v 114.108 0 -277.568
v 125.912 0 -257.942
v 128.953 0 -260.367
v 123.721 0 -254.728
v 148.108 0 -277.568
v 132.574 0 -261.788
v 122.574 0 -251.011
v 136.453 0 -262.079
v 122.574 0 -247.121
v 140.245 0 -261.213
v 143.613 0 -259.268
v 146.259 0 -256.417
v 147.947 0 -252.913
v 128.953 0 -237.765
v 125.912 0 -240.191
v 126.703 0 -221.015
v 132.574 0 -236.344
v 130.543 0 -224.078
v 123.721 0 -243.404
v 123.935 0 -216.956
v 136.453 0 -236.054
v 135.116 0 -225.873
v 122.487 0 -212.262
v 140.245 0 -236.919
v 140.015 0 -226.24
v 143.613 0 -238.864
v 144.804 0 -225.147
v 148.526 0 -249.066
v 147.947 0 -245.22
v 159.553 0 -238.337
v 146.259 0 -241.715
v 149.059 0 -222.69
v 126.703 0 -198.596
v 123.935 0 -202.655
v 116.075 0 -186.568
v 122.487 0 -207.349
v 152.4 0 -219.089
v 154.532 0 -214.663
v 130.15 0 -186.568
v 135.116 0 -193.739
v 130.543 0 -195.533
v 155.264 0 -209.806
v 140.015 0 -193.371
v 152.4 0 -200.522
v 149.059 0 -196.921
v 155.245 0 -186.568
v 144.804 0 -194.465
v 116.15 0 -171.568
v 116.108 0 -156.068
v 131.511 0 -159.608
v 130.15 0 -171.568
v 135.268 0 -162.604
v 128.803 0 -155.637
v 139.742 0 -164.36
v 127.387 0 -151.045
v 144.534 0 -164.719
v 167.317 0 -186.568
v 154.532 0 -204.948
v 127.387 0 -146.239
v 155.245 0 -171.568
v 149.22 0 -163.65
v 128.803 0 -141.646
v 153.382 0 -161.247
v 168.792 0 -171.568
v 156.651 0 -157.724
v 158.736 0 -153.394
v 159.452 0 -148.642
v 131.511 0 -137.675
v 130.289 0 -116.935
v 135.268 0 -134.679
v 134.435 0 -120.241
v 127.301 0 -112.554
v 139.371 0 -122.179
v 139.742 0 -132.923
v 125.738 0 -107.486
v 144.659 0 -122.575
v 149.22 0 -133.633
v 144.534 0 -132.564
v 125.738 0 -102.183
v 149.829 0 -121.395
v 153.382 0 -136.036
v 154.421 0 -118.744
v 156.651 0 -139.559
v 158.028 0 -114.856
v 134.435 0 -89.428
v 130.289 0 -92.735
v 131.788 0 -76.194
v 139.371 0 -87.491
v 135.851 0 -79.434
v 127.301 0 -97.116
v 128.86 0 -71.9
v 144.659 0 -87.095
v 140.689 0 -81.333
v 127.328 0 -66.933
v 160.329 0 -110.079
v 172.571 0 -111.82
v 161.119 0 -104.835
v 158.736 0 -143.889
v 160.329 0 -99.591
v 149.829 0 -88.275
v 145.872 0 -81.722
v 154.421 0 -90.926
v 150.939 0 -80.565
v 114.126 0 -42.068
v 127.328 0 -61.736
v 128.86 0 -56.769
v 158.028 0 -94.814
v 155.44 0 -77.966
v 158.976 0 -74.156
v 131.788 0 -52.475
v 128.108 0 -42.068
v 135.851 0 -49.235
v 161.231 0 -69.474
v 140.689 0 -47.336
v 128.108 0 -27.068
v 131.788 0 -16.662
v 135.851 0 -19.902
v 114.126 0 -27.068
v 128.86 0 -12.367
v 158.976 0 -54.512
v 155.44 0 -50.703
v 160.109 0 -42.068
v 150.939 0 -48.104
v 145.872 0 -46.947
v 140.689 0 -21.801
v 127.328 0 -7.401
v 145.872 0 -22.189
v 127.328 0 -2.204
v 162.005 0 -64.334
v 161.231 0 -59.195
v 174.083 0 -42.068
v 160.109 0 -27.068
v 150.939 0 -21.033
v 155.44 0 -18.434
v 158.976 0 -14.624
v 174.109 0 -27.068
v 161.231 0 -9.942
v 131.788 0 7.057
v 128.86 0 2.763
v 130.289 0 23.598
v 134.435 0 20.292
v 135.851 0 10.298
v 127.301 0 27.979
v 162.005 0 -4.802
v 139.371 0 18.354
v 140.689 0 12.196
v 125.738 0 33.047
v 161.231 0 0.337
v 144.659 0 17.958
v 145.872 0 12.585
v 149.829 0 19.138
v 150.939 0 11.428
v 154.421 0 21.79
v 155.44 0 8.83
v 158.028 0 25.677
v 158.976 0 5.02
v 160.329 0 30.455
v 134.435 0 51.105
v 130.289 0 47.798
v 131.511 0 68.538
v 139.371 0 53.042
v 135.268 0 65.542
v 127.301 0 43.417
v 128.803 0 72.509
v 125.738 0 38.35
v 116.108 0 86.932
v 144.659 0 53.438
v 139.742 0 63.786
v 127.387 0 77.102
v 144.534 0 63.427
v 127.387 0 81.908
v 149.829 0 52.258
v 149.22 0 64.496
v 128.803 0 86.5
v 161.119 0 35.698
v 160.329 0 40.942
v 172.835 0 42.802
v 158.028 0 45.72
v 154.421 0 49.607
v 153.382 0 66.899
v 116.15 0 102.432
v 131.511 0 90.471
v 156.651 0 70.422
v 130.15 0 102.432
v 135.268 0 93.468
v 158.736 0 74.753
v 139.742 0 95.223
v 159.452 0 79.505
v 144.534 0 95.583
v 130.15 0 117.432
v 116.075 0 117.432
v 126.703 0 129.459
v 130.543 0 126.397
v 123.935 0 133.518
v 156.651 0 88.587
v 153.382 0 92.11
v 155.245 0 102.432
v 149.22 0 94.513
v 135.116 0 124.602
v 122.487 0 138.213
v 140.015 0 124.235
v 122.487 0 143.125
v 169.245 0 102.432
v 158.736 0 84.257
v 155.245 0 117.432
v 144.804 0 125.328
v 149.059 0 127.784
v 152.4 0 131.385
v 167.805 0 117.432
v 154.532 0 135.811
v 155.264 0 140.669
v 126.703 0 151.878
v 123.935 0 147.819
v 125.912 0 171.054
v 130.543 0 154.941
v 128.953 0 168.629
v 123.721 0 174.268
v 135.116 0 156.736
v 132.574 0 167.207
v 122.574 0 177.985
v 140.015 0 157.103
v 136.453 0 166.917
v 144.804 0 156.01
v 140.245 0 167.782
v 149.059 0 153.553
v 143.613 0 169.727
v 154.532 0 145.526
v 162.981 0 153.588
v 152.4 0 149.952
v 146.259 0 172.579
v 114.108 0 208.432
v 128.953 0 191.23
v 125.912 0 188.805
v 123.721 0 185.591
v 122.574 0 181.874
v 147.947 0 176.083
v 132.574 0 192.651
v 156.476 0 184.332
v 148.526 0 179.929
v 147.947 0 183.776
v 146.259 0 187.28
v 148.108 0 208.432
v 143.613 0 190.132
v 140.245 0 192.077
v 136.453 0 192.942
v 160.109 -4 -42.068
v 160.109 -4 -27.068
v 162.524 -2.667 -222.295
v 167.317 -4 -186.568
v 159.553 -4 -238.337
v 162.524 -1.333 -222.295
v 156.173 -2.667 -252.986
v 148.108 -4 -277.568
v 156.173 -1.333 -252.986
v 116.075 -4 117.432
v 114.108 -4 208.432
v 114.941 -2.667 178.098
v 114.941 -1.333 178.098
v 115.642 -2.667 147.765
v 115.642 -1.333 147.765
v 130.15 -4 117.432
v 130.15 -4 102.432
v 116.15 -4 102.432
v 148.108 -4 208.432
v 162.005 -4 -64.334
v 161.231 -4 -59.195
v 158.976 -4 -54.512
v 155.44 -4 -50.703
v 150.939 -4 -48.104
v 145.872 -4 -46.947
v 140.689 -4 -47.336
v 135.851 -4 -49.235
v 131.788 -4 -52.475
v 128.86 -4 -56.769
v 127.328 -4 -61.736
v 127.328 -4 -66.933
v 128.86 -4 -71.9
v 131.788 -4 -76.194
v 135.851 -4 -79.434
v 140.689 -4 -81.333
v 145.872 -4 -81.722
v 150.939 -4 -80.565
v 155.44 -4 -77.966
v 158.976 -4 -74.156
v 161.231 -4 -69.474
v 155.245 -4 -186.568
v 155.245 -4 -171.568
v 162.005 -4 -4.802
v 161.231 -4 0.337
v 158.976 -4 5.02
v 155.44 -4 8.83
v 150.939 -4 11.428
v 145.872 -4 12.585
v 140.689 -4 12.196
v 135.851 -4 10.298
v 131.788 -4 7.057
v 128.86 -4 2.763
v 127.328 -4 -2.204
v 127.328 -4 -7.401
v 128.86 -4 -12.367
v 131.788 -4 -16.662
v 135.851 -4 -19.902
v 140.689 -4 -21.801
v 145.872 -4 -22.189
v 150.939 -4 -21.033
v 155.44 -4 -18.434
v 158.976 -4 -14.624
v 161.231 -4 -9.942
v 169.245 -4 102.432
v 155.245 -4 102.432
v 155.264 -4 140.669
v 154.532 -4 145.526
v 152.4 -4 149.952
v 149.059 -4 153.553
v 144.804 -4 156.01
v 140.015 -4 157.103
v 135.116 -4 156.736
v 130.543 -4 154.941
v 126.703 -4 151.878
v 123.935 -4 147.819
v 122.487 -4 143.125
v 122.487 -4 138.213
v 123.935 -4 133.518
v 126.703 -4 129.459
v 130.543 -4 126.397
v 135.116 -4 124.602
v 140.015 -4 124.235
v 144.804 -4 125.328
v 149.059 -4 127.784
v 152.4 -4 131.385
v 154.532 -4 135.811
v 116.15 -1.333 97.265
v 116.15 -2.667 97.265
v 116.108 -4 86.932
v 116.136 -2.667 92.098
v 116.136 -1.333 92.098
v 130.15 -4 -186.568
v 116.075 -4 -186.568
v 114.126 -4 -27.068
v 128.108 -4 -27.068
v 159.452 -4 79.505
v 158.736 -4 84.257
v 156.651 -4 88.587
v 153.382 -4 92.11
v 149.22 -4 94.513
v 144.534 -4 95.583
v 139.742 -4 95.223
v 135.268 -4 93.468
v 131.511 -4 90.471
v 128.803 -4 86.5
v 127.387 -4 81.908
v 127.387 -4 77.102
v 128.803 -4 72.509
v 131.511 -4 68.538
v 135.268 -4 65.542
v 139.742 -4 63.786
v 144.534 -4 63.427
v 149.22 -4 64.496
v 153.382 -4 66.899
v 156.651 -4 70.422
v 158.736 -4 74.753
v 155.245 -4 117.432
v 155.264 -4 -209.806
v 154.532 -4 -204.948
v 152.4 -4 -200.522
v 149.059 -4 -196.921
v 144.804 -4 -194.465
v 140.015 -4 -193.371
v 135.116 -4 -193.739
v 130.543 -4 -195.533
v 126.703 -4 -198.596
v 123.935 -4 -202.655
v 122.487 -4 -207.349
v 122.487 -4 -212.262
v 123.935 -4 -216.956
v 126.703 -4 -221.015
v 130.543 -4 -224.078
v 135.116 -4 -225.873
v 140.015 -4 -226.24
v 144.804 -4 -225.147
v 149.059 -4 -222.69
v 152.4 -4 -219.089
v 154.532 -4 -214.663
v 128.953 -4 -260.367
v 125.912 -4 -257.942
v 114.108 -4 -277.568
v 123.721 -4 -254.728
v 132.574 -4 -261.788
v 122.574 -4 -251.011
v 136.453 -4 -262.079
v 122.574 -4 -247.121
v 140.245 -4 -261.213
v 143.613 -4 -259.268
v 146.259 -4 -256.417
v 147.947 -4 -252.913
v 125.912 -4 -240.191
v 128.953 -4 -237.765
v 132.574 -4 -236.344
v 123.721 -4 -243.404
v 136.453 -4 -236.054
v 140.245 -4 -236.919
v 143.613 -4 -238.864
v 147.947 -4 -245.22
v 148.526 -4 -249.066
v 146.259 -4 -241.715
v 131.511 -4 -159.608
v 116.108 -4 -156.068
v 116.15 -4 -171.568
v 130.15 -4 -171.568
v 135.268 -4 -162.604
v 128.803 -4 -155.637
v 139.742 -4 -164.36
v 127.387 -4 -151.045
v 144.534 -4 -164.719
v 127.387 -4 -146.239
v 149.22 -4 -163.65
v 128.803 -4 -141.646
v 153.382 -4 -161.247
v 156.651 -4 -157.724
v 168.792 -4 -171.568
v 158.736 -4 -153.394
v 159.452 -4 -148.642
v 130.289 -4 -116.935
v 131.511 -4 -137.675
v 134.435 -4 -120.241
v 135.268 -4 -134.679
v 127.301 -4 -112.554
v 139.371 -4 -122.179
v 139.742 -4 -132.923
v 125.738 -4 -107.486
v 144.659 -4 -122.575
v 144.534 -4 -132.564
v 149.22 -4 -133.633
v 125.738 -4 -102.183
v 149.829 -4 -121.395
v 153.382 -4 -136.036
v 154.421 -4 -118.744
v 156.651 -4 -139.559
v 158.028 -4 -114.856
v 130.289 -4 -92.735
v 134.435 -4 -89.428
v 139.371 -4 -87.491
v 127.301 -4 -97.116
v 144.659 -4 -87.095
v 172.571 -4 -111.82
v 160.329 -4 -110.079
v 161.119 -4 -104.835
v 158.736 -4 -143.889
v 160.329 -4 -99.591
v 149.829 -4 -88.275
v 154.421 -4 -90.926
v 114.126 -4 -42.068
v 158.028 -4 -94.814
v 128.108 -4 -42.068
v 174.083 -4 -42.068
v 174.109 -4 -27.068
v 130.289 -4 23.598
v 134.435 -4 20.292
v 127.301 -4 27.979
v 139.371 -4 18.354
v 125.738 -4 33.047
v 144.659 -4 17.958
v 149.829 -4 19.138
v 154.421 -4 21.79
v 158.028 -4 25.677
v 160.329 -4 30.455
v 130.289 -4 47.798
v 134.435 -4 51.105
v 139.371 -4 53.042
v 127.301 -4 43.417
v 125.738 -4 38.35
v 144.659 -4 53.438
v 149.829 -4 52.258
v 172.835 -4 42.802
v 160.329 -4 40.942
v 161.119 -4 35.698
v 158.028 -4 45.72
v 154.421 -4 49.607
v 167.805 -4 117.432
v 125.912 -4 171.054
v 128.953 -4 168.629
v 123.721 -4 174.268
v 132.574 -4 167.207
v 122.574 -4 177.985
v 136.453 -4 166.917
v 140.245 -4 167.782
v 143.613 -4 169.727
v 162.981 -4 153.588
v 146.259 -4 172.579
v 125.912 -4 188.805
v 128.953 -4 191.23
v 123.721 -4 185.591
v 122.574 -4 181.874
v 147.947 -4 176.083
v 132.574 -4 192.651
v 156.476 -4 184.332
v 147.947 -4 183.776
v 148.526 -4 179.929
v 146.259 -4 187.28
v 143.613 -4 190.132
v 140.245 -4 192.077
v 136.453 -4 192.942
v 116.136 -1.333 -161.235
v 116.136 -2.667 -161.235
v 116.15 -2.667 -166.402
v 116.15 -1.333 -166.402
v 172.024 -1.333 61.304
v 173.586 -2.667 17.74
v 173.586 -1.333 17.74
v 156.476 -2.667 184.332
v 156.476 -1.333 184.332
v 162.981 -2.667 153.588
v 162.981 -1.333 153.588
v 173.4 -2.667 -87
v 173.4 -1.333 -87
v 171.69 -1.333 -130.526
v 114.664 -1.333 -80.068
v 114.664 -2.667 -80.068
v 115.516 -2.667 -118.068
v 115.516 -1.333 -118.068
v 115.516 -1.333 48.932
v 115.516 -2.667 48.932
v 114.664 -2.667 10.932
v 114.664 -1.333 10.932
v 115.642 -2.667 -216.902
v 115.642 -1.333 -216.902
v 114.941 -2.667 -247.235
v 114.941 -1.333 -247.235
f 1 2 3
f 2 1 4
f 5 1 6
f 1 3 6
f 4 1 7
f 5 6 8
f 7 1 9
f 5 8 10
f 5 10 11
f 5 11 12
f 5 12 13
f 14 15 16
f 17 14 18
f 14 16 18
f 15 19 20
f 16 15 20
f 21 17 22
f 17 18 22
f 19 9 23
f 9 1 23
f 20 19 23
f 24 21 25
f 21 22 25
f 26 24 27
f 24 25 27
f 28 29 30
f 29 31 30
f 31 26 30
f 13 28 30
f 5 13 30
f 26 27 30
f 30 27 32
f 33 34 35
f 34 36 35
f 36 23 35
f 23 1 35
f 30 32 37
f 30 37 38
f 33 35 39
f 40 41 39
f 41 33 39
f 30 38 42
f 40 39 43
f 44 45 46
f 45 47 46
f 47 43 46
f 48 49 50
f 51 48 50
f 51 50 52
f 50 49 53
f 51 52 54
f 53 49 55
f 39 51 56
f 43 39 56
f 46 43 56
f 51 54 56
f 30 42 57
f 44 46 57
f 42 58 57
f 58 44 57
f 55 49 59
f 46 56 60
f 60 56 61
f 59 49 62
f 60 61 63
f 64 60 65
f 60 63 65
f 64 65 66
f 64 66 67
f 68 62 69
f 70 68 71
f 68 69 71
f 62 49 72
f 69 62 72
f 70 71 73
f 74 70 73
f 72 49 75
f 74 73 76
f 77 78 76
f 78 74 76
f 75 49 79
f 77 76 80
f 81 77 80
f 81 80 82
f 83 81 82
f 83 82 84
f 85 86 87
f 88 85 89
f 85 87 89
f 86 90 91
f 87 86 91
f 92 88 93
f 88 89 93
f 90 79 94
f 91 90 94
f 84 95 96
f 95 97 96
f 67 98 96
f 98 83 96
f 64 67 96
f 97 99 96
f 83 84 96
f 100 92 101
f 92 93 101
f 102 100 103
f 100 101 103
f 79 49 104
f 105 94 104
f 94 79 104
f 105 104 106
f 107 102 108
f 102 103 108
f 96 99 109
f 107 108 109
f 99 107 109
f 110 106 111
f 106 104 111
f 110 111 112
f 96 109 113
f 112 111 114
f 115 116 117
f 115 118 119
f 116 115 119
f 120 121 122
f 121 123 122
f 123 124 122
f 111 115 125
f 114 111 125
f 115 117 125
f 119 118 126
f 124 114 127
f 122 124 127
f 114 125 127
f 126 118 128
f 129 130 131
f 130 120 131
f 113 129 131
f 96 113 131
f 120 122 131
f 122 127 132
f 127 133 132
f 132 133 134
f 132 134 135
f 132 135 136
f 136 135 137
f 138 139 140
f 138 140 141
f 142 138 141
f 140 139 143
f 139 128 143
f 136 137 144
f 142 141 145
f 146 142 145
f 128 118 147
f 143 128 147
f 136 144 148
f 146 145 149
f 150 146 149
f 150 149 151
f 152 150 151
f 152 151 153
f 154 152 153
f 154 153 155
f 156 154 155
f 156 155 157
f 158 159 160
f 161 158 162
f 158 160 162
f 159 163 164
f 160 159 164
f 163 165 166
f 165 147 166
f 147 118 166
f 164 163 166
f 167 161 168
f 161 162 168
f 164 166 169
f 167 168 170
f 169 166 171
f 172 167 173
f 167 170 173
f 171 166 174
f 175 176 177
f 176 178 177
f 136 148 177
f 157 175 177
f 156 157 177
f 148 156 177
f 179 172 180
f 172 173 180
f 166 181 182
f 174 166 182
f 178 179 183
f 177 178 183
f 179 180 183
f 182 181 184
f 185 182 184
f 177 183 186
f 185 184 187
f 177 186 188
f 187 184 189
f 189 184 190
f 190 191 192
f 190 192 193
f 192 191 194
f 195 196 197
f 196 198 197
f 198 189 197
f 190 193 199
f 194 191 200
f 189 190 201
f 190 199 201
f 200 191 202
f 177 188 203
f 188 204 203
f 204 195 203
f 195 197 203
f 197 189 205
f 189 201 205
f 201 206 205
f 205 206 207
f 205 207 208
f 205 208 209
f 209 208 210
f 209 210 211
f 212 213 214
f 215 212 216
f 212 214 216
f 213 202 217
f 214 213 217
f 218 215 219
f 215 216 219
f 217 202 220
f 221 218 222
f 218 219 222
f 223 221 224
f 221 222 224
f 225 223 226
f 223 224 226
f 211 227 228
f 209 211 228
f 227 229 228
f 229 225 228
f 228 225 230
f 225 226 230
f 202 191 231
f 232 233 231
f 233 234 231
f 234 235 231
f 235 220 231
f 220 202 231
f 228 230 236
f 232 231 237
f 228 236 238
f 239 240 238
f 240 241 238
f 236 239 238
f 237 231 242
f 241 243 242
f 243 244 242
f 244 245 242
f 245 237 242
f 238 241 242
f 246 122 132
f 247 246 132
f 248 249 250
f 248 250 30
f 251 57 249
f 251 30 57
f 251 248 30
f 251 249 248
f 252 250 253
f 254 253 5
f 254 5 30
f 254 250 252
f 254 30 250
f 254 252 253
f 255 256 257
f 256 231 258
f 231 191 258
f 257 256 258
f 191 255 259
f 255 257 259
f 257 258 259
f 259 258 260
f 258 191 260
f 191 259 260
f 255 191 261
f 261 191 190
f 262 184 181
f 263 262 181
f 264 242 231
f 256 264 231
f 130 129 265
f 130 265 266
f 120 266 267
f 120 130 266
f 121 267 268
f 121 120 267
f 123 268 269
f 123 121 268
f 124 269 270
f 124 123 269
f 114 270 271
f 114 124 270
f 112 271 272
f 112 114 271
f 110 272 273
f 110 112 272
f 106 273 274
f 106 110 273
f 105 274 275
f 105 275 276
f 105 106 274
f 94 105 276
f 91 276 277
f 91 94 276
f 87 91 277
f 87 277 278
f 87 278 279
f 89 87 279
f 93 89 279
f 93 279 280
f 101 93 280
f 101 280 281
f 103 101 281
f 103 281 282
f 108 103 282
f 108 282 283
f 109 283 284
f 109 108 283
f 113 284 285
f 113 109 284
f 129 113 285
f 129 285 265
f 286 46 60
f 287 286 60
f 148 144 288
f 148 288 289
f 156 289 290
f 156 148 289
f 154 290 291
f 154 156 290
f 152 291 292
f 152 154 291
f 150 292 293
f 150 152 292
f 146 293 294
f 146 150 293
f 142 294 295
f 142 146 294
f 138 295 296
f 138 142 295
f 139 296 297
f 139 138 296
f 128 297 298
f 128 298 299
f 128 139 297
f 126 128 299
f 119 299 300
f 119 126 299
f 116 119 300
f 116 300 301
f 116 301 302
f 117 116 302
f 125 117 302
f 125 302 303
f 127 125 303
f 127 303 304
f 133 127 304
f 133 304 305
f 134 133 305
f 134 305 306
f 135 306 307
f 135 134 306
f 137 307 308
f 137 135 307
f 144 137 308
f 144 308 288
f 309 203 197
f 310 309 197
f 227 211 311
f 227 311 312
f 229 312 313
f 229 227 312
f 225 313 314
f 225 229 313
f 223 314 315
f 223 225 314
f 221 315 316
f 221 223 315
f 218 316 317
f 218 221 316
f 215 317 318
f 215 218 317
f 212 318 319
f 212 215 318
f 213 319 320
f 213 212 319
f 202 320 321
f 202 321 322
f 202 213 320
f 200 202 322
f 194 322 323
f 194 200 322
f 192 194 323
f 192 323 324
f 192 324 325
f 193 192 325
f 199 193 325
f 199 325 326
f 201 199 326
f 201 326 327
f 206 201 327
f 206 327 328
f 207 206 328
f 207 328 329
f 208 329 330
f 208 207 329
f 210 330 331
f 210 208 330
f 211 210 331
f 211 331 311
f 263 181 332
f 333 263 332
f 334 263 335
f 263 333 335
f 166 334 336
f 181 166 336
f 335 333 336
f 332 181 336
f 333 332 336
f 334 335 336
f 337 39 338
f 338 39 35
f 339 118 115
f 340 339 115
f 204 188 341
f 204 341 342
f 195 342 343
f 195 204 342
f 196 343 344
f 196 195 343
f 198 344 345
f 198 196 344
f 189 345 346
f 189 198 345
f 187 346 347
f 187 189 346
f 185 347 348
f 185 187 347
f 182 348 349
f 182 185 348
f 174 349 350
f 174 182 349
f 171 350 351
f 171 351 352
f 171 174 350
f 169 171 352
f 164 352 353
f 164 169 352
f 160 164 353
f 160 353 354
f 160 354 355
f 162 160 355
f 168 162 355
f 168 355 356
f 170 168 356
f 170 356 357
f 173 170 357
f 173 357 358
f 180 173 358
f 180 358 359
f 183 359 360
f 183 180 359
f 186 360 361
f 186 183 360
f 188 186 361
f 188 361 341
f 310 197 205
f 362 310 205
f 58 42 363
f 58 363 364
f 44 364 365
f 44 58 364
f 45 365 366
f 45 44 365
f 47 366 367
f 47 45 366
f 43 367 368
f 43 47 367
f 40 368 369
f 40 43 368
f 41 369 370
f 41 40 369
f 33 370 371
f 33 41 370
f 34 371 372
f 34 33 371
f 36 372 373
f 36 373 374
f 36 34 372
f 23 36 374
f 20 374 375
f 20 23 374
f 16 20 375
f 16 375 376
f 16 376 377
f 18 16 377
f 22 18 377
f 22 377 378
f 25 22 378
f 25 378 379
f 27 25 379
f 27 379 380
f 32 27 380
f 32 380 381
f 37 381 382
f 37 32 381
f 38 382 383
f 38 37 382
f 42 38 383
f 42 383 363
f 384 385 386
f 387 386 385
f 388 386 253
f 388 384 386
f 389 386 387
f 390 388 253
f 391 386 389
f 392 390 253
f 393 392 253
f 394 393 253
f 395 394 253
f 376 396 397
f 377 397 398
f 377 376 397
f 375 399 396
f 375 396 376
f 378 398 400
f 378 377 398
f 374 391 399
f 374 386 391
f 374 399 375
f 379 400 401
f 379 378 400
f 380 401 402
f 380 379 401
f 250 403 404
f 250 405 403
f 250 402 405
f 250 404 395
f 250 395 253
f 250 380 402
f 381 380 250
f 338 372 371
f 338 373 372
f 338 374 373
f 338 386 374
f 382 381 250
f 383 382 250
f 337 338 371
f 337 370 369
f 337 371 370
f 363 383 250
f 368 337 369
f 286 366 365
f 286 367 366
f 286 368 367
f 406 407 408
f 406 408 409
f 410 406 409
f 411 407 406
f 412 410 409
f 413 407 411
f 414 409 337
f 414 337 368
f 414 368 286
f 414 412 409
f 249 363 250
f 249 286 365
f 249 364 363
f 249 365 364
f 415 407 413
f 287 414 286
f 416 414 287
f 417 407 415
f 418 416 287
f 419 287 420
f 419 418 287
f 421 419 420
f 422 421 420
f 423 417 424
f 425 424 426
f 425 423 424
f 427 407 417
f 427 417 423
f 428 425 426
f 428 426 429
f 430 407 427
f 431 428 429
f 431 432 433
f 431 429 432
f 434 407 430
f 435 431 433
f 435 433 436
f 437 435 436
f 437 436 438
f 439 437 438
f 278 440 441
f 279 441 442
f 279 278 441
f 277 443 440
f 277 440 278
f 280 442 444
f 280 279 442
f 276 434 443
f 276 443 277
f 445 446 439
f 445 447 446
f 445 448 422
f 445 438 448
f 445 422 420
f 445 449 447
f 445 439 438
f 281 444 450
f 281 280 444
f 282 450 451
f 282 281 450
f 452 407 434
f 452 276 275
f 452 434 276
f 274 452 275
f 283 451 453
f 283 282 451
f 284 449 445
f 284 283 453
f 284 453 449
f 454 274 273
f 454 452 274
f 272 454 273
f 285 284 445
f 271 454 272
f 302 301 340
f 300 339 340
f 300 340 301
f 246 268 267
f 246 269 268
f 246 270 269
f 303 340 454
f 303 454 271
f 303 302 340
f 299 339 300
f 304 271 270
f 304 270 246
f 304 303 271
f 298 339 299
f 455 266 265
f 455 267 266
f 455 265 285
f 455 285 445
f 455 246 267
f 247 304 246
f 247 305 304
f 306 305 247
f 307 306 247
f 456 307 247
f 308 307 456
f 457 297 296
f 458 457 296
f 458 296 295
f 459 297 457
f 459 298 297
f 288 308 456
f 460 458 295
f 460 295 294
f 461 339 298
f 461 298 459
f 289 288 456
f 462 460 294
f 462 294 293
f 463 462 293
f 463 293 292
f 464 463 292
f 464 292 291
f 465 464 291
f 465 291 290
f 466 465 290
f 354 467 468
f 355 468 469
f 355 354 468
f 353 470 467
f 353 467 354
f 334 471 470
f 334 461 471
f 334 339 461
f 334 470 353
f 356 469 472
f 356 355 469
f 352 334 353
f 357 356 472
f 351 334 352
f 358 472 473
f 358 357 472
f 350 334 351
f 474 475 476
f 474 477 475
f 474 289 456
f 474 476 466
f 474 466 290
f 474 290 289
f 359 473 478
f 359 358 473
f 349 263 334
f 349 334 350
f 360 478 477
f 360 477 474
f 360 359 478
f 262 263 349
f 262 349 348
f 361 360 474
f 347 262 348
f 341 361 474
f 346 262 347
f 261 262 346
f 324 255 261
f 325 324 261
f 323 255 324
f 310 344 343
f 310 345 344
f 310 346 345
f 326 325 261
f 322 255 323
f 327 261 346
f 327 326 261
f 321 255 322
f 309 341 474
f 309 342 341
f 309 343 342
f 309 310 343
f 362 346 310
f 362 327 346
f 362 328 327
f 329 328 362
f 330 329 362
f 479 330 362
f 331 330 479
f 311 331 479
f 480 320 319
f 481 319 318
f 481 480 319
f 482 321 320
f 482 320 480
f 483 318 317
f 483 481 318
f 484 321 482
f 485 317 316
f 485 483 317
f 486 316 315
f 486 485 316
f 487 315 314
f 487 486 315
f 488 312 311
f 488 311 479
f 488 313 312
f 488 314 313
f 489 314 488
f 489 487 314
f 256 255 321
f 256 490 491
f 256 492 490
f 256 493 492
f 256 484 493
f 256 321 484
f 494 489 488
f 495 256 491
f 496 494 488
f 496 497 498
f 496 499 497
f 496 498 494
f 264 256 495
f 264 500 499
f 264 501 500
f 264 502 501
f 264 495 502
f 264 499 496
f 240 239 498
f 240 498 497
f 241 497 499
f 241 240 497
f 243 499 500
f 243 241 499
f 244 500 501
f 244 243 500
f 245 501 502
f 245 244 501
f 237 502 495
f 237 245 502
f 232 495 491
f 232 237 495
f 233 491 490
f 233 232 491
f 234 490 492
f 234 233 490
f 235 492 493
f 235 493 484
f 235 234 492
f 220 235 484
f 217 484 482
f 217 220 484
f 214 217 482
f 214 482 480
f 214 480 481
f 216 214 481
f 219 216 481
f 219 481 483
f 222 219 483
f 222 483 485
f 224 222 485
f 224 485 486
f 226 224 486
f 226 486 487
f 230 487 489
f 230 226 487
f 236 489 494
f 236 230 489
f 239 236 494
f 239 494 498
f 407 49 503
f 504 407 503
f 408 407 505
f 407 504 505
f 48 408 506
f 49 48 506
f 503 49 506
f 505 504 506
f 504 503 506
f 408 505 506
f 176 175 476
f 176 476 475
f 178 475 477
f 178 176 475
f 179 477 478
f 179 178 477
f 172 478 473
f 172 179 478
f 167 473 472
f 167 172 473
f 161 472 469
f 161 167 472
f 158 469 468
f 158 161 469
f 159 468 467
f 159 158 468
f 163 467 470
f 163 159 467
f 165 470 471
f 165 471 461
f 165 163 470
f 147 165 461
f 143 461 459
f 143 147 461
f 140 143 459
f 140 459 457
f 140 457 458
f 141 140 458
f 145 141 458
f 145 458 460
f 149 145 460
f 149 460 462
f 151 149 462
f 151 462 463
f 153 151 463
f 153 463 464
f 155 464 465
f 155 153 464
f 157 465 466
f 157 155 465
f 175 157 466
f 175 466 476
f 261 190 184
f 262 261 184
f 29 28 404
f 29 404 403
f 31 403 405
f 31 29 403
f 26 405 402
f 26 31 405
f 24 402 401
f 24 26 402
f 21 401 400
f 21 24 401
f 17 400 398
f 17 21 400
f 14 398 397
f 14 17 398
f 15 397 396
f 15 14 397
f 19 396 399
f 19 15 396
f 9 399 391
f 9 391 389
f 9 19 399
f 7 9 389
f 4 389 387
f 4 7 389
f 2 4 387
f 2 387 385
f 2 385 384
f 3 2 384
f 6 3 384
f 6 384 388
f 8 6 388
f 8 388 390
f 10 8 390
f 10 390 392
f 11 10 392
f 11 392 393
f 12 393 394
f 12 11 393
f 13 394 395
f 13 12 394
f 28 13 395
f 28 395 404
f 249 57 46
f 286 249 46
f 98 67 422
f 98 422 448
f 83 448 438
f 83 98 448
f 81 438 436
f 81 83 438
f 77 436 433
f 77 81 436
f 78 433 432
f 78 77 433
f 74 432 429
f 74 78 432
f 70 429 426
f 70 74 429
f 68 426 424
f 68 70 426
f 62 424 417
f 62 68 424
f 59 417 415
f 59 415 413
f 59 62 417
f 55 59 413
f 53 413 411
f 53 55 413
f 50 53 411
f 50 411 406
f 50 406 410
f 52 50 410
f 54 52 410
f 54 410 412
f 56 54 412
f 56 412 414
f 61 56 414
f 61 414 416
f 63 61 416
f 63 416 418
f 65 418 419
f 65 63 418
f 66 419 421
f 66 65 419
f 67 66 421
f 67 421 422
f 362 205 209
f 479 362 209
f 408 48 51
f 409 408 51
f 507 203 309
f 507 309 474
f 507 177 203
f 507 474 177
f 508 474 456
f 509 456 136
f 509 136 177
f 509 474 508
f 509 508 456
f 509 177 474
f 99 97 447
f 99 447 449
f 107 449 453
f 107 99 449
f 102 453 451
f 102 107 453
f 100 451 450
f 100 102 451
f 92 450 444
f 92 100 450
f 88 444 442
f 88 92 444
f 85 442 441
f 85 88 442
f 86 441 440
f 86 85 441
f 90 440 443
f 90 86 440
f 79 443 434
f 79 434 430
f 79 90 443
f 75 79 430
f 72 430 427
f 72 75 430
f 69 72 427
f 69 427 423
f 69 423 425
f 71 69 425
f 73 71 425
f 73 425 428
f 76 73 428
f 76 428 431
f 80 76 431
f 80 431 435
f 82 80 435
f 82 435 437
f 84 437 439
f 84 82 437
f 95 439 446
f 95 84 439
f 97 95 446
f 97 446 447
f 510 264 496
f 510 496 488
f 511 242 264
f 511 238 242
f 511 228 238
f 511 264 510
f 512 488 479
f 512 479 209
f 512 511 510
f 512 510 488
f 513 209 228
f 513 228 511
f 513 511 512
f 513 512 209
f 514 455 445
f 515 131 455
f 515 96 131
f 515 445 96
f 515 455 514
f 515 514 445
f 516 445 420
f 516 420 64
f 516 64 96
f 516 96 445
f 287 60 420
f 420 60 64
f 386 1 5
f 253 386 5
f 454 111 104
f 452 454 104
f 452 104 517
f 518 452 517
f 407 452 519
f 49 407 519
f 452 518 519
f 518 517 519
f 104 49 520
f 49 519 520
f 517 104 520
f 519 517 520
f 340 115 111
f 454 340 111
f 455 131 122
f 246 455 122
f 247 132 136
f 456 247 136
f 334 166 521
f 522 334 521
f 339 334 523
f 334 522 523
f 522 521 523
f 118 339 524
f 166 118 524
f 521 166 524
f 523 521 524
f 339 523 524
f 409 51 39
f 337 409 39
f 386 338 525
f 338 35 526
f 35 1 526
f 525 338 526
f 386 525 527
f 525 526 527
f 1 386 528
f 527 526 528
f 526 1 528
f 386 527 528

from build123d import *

# Parameters (mm, degrees)
F0_R     = 17.789827
F0_R_2   = 16.122829
F0_R_3   = 17.435886
F0_R_4   = 16.480186
F0_R_5   = 13.049133
F1_DEPTH = 4


with BuildPart() as f1:
    # F0 (on Front) → F1 (new body)
    with BuildSketch(Plane.XZ):
        with BuildLine():
            Line((128.107603, -34.568384), (160.109099, -34.568384))
            Line((160.109099, -34.568384), (160.109099, -27.068384))
            Line((160.109099, -27.068384), (174.109099, -27.068384))
            add(Edge.make_bspline(
                [(169.24465, 102.431616), (172.691915, 62.91882), (174.04711, 17.96585), (174.109099, -27.068384)],
                knots=[126.909658, 126.909658, 126.909658, 126.909658, 238.208295, 238.208295, 238.208295, 238.208295], degree=3))
            Line((169.24465, 102.431616), (155.24465, 102.431616))
            Line((155.24465, 102.431616), (155.24465, 109.931616))
            Line((155.24465, 109.931616), (130.150168, 109.931616))
            Line((130.150168, 109.931616), (130.150168, 102.431616))
            Line((130.150168, 102.431616), (116.150168, 102.431616))
            add(Edge.make_bspline(
                [(116.150168, 102.431616), (116.157251, 97.264949), (116.144052, 92.098282), (116.107603, 86.931616)],
                knots=[106.01436, 106.01436, 106.01436, 106.01436, 121.51646, 121.51646, 121.51646, 121.51646], degree=3))
            add(Edge.make_bspline(
                [(116.107603, 86.931616), (115.839525, 48.931616), (114.313799, 10.931616), (114.12646, -27.068384)],
                knots=[121.51646, 121.51646, 121.51646, 121.51646, 235.531904, 235.531904, 235.531904, 235.531904], degree=3))
            Line((114.12646, -27.068384), (128.107603, -27.068384))
            Line((128.107603, -27.068384), (128.107603, -34.568384))
        make_face()
        with Locations((143.329501, 35.698157)):
            Circle(F0_R, mode=Mode.SUBTRACT)
        with Locations((143.329501, 79.504788)):
            Circle(F0_R_2, mode=Mode.SUBTRACT)
        with Locations((144.569308, -4.802315)):
            Circle(F0_R_3, mode=Mode.SUBTRACT)
        with BuildLine():
            Line((155.24465, 117.431616), (167.805281, 117.431616))
            add(Edge.make_bspline(
                [(148.107603, 208.431616), (157.469501, 188.064638), (163.759947, 155.883562), (167.805281, 117.431616)],
                knots=[0, 0, 0, 0, 112.560289, 112.560289, 112.560289, 112.560289], degree=3))
            Line((148.107603, 208.431616), (114.107603, 208.431616))
            add(Edge.make_bspline(
                [(114.107603, 208.431616), (114.96357, 178.098282), (115.819537, 147.764949), (116.075302, 117.431616)],
                knots=[0, 0, 0, 0, 91.012328, 91.012328, 91.012328, 91.012328], degree=3))
            Line((116.075302, 117.431616), (116.150168, 117.431616))
            Line((116.150168, 117.431616), (130.150168, 117.431616))
            Line((130.150168, 117.431616), (130.150168, 109.931616))
            Line((130.150168, 109.931616), (155.24465, 109.931616))
            Line((155.24465, 109.931616), (155.24465, 117.431616))
        make_face()
        with Locations((138.783529, 140.668765)):
            Circle(F0_R_4, mode=Mode.SUBTRACT)
        with Locations((135.477364, 179.929435)):
            Circle(F0_R_5, mode=Mode.SUBTRACT)
        with BuildLine():
            Line((160.109099, -42.068384), (160.109099, -34.568384))
            Line((160.109099, -34.568384), (128.107603, -34.568384))
            Line((128.107603, -34.568384), (128.107603, -42.068384))
            Line((128.107603, -42.068384), (114.12646, -42.068384))
            add(Edge.make_bspline(
                [(114.12646, -42.068384), (114.313799, -80.068384), (115.839525, -118.068384), (116.107603, -156.068384)],
                knots=[250.533936, 250.533936, 250.533936, 250.533936, 364.549379, 364.549379, 364.549379, 364.549379], degree=3))
            add(Edge.make_bspline(
                [(116.107603, -156.068384), (116.144052, -161.235051), (116.157251, -166.401718), (116.150168, -171.568384)],
                knots=[364.549379, 364.549379, 364.549379, 364.549379, 380.051479, 380.051479, 380.051479, 380.051479], degree=3))
            Line((116.150168, -171.568384), (130.150168, -171.568384))
            Line((130.150168, -171.568384), (130.150168, -179.068384))
            Line((130.150168, -179.068384), (130.150168, -186.568384))
            Line((130.150168, -186.568384), (116.150168, -186.568384))
            Line((116.150168, -186.568384), (116.075302, -186.568384))
            add(Edge.make_bspline(
                [(116.075302, -186.568384), (115.819537, -216.901718), (114.96357, -247.235051), (114.107603, -277.568384)],
                knots=[395.053511, 395.053511, 395.053511, 395.053511, 486.065839, 486.065839, 486.065839, 486.065839], degree=3))
            Line((114.107603, -277.568384), (148.107603, -277.568384))
            add(Edge.make_bspline(
                [(167.317003, -186.568384), (163.250156, -224.455468), (157.083255, -256.397009), (148.107603, -277.568384)],
                knots=[377.036866, 377.036866, 377.036866, 377.036866, 488.773976, 488.773976, 488.773976, 488.773976], degree=3))
            Line((167.317003, -186.568384), (155.24465, -186.568384))
            Line((155.24465, -186.568384), (155.24465, -179.068384))
            Line((155.24465, -179.068384), (155.24465, -171.568384))
            Line((155.24465, -171.568384), (168.792157, -171.568384))
            add(Edge.make_bspline(
                [(174.082738, -42.068384), (173.861315, -87.342067), (172.335726, -132.128552), (168.792157, -171.568384)],
                knots=[250.568896, 250.568896, 250.568896, 250.568896, 362.574274, 362.574274, 362.574274, 362.574274], degree=3))
            Line((174.082738, -42.068384), (160.109099, -42.068384))
        make_face()
        with Locations((135.477364, -249.066204)):
            Circle(F0_R_5, mode=Mode.SUBTRACT)
        with Locations((138.783529, -209.805533)):
            Circle(F0_R_4, mode=Mode.SUBTRACT)
        with Locations((143.329501, -148.641557)):
            Circle(F0_R_2, mode=Mode.SUBTRACT)
        with Locations((143.329501, -104.834925)):
            Circle(F0_R, mode=Mode.SUBTRACT)
        with Locations((144.569308, -64.334454)):
            Circle(F0_R_3, mode=Mode.SUBTRACT)
    extrude(amount=F1_DEPTH)


solid = f1.part
